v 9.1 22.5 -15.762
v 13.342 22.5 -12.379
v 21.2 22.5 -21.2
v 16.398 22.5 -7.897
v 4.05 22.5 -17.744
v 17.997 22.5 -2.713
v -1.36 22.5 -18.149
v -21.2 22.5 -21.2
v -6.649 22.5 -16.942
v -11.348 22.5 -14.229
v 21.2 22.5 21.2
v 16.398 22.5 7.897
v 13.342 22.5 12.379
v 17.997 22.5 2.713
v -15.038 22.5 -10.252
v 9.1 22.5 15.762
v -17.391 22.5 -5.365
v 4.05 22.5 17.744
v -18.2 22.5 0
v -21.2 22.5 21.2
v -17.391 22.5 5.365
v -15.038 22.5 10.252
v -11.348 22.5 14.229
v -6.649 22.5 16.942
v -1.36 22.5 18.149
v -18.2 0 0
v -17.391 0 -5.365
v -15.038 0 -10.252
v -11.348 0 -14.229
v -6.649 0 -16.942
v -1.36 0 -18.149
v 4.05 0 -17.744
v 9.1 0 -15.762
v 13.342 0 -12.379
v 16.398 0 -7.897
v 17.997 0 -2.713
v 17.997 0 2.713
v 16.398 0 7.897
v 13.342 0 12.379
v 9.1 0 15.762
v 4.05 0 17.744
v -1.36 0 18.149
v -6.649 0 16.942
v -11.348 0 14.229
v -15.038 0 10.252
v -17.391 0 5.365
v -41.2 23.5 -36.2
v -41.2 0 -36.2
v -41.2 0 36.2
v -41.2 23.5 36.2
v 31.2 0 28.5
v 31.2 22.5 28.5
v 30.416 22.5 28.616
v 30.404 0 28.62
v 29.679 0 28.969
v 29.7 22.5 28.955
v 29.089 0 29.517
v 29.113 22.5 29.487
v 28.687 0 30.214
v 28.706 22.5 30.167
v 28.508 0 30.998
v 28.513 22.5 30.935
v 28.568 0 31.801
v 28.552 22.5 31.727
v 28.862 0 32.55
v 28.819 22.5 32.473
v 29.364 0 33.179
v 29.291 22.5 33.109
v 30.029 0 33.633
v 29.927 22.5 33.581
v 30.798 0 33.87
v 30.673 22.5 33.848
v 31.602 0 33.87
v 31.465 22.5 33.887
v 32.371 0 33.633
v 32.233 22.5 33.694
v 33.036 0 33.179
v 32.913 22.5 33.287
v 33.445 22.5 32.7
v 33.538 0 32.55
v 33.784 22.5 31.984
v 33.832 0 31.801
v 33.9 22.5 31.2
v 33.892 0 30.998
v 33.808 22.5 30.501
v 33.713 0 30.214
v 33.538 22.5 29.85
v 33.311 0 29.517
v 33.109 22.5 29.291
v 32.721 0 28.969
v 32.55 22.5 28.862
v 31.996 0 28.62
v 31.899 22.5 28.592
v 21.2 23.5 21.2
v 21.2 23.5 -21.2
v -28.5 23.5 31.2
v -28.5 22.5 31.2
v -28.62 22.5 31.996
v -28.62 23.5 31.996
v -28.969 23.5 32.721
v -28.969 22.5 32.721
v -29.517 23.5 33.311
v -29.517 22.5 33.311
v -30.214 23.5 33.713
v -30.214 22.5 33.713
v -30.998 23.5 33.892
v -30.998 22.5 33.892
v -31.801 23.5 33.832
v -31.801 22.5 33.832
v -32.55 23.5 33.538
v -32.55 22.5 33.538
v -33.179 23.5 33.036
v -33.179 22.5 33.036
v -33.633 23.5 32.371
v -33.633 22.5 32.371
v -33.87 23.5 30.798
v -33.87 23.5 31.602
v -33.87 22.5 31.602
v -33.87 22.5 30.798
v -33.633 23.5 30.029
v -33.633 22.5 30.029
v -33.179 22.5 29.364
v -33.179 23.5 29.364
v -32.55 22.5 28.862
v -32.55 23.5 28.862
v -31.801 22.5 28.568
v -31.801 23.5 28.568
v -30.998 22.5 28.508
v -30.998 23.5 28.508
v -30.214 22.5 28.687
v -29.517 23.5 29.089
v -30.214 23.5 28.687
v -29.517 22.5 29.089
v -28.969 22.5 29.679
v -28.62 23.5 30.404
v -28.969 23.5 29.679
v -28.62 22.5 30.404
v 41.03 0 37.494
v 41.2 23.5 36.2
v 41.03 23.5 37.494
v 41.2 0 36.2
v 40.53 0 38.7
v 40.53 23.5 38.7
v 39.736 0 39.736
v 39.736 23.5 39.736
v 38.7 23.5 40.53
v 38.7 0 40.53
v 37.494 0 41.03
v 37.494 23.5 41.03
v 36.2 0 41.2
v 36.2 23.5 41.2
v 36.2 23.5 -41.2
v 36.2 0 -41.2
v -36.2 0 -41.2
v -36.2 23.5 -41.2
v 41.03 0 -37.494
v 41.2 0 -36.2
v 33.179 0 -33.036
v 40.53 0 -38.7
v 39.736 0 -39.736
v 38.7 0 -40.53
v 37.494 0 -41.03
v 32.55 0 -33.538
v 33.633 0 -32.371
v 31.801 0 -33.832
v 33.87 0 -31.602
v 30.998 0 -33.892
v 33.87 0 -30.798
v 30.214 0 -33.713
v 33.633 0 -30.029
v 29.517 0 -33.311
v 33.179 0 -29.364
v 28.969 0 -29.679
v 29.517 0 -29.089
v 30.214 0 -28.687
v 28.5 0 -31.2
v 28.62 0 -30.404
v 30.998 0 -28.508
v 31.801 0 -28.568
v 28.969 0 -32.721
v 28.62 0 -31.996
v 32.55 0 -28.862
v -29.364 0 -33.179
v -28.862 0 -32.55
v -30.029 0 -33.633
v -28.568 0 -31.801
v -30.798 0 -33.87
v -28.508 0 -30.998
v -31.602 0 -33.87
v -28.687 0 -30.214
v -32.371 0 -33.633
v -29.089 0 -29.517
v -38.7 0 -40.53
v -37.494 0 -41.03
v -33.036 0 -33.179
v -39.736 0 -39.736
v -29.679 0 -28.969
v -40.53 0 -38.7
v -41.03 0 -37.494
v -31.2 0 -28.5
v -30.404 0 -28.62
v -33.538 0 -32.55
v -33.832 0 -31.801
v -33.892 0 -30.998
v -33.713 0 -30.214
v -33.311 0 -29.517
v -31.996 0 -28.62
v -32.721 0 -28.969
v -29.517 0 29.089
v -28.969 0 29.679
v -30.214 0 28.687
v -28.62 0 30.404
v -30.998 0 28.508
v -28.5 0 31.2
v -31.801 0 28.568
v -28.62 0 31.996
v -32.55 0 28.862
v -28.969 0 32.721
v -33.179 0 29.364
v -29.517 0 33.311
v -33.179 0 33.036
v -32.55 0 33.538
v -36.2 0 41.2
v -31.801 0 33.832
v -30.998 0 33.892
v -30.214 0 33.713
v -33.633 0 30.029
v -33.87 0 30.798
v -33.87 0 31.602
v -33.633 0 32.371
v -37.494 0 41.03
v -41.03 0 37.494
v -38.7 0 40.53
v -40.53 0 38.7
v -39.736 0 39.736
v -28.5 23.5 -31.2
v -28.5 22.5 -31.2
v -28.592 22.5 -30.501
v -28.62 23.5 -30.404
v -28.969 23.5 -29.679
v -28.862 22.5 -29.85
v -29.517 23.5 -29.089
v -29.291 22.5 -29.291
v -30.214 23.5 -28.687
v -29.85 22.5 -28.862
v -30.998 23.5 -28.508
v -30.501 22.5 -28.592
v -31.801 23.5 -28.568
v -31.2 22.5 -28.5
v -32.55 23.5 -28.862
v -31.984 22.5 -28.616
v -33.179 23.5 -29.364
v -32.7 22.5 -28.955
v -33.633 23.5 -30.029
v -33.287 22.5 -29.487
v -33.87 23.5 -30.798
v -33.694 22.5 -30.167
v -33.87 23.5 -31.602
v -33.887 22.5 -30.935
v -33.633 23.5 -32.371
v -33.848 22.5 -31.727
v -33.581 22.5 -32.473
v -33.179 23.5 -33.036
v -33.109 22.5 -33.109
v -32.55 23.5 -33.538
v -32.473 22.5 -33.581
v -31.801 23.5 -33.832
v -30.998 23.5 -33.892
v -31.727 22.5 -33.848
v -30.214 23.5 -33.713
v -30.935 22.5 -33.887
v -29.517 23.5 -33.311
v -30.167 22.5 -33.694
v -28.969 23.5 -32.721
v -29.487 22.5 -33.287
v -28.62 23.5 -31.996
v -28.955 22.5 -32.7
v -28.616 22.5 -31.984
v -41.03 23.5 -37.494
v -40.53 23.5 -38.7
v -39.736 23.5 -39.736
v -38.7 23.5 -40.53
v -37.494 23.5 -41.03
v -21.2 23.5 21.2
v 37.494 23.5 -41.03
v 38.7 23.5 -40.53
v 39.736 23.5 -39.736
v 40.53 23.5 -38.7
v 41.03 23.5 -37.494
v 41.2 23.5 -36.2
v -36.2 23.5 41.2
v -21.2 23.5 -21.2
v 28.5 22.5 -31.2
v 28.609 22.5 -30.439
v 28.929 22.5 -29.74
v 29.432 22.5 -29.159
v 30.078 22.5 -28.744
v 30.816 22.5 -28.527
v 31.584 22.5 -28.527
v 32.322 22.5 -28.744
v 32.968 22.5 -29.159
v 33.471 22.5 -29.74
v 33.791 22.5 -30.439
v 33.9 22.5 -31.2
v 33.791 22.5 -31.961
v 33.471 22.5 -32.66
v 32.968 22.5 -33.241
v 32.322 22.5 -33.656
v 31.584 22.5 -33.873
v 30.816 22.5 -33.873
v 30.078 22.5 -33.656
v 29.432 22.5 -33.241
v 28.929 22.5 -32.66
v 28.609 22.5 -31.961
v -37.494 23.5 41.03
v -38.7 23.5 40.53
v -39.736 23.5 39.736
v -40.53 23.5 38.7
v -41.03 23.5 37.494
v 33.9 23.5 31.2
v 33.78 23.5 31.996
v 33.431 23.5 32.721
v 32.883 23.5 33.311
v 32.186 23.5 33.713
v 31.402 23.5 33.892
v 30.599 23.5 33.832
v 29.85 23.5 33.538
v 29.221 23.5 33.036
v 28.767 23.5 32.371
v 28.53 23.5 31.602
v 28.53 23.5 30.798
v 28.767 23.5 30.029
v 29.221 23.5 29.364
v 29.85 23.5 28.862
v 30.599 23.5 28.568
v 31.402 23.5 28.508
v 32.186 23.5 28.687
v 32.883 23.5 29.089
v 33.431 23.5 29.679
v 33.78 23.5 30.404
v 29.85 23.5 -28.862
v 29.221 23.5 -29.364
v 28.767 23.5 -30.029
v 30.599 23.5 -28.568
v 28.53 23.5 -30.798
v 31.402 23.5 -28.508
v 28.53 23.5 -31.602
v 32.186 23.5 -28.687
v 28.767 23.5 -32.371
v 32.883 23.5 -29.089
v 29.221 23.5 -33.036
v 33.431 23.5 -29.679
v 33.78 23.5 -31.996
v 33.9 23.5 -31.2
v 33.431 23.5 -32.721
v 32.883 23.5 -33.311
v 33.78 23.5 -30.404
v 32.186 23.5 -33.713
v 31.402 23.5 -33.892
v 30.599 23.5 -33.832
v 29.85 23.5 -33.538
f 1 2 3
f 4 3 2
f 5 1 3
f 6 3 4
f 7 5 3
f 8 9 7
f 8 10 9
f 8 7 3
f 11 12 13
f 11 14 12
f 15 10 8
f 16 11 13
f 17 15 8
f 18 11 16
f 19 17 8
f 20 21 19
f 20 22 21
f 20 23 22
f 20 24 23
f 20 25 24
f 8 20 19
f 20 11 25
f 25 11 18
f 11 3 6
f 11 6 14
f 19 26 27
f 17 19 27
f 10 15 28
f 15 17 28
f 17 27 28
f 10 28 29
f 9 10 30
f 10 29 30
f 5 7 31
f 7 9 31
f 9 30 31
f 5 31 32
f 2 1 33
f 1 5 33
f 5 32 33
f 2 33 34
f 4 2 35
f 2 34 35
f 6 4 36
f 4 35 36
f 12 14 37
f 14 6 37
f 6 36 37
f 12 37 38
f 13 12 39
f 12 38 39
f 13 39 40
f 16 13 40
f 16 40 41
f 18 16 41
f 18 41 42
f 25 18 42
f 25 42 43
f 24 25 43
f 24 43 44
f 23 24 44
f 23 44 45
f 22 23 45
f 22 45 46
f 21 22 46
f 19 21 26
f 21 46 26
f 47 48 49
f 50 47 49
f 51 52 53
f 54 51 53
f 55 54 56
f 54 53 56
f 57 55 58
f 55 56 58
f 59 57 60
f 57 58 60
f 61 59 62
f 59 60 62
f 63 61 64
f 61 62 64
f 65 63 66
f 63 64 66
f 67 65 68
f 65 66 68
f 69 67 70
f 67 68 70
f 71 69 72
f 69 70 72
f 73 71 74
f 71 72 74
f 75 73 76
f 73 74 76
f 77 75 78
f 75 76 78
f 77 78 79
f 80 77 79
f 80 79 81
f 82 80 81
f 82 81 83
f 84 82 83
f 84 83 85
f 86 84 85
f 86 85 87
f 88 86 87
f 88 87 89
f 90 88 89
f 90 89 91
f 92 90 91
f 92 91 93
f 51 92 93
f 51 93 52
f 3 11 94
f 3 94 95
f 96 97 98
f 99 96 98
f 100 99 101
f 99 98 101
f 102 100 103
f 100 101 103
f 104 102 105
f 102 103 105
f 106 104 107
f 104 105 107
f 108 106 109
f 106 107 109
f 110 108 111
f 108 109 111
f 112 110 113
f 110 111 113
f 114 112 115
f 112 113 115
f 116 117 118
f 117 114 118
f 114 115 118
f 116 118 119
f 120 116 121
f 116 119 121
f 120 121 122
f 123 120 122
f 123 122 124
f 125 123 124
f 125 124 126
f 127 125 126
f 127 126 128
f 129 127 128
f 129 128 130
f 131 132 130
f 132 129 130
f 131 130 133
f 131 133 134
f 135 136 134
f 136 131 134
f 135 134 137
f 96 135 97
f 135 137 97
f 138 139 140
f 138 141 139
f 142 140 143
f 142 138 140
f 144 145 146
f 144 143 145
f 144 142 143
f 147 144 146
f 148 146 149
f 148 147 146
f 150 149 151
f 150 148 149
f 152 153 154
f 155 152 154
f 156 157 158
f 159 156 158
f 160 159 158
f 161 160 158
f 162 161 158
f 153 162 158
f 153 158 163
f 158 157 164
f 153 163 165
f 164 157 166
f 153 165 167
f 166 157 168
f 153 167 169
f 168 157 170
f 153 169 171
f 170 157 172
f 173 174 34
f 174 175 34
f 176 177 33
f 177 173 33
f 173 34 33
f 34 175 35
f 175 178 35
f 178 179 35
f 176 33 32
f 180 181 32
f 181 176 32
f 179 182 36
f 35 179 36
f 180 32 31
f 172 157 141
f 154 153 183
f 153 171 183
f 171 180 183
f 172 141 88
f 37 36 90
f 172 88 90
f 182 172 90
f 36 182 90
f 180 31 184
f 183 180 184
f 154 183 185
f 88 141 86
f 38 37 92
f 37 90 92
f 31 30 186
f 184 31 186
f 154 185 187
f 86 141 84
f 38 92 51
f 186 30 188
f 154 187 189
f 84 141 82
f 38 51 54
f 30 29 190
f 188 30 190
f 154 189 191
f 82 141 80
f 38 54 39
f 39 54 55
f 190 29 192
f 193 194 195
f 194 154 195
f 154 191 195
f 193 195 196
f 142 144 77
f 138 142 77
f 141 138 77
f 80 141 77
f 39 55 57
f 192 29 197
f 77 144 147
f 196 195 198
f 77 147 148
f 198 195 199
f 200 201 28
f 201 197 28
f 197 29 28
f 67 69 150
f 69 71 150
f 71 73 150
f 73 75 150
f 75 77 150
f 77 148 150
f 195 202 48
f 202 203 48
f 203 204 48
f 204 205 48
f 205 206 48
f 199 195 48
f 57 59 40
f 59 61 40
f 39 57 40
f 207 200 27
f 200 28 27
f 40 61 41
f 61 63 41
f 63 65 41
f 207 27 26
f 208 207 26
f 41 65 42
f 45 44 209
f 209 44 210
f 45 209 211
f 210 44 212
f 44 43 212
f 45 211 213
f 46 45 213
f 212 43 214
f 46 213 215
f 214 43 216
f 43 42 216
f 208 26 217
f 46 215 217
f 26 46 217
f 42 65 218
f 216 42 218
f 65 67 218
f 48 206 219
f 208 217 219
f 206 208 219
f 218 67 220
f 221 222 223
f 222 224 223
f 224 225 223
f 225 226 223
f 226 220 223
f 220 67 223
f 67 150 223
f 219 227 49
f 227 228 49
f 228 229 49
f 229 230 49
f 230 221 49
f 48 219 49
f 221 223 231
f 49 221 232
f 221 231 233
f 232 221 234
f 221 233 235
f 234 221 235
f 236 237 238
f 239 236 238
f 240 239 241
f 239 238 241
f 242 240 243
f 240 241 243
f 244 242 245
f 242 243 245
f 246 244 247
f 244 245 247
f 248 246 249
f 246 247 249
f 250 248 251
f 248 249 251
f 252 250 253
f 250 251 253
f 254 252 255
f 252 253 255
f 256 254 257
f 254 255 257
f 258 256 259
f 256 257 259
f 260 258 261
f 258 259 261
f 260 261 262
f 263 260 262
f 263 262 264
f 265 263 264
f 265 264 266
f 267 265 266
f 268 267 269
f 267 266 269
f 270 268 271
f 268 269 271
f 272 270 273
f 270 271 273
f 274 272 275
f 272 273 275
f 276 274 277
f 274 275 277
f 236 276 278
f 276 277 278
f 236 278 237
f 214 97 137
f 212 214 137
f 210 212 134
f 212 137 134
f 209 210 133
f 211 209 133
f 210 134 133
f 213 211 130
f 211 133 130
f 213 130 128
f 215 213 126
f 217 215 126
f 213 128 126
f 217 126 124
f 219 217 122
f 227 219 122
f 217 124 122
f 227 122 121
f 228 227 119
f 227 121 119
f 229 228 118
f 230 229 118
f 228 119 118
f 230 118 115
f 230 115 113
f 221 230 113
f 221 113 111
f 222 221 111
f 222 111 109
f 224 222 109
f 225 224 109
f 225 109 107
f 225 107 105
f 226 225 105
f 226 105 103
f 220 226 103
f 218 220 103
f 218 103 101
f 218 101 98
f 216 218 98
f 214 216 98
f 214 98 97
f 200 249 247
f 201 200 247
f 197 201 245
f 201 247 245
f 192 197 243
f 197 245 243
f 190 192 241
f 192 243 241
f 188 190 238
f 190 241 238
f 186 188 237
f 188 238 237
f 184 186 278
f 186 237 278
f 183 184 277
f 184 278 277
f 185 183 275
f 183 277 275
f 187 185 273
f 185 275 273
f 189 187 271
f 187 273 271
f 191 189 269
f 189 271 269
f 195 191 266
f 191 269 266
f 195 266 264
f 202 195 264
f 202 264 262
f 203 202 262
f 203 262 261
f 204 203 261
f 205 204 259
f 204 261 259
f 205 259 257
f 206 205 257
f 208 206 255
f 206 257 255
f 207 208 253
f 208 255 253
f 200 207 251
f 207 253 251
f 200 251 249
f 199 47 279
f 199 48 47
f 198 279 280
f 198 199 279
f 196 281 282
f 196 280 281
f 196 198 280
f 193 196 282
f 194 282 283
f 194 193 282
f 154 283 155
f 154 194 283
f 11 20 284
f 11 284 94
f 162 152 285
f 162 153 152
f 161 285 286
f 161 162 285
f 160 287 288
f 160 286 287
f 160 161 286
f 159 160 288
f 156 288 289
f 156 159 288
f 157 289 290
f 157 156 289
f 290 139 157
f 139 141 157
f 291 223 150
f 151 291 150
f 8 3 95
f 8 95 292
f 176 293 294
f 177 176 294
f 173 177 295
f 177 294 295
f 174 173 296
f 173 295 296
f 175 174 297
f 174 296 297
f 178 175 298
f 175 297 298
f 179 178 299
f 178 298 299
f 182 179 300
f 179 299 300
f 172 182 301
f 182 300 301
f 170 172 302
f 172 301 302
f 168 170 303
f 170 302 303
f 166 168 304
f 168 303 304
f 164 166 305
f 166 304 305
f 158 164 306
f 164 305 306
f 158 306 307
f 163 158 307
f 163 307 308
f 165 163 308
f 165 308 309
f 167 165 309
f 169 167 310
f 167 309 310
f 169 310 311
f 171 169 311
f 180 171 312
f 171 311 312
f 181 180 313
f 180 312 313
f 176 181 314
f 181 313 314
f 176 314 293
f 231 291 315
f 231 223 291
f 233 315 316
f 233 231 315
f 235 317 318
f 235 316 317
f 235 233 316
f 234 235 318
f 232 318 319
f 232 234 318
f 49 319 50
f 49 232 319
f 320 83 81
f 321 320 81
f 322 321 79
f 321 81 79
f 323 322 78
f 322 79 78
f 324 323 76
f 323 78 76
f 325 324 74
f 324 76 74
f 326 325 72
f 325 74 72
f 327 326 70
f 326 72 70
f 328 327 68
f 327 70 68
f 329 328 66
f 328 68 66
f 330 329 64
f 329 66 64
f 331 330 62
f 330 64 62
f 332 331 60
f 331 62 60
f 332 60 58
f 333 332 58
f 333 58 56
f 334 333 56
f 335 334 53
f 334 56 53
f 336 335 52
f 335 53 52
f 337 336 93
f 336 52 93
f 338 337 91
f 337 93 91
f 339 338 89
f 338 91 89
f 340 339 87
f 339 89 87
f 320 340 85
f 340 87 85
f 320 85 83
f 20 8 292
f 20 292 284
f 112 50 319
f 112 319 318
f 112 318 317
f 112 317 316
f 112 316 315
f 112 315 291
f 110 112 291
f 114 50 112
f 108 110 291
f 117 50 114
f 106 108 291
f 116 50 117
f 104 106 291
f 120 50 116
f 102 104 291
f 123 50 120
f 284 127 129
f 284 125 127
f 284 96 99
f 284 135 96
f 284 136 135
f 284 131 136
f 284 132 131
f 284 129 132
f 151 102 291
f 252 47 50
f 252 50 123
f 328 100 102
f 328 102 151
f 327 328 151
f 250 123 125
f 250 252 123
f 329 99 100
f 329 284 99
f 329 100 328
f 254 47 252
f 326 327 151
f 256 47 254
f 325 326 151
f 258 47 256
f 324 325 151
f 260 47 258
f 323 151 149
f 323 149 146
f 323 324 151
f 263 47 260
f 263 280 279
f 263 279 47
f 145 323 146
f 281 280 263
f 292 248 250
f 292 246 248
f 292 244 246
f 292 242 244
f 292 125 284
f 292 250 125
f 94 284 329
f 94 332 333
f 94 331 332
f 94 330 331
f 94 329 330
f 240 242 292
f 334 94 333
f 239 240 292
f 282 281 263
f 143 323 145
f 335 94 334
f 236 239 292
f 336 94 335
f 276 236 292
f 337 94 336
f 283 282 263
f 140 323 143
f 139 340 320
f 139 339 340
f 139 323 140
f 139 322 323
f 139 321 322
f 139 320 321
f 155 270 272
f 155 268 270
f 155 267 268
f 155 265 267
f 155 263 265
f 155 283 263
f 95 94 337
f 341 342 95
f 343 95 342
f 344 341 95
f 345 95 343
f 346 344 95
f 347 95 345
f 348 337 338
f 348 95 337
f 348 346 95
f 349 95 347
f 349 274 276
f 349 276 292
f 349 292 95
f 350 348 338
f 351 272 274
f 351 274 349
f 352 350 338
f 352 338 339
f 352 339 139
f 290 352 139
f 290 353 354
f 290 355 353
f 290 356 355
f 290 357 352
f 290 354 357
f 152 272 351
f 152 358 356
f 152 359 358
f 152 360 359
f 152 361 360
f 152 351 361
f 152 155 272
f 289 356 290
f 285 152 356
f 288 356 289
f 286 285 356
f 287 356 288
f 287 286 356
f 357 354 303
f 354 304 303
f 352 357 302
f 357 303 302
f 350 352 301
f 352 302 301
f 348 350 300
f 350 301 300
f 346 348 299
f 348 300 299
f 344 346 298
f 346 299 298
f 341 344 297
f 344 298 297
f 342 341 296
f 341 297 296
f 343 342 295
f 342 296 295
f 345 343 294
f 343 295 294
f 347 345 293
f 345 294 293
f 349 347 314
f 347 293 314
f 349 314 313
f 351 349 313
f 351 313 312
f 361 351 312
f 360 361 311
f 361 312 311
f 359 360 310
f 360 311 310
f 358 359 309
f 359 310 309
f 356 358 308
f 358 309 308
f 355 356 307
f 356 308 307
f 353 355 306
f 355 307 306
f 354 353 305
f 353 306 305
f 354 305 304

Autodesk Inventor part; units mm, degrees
ref_plane "YZ Plane" through (0, 0, 0) normal (1, 0, 0) x (0, 1, 0)
ref_plane "XZ Plane" through (0, 0, 0) normal (0, 1, 0) x (-1, 0, 0)
ref_plane "XY Plane" through (0, 0, 0) normal (0, 0, 1) x (1, 0, 0)
sketch "Boceto1" plane through (0, 0, 0) normal (0, 1, 0) x (-1, 0, 0)
  line L0 (-41.2, 41.2) -> (41.2, 41.2)
  line L1 (41.2, 41.2) -> (41.2, -41.2)
  line L2 (41.2, -41.2) -> (-41.2, -41.2)
  line L3 (-41.2, -41.2) -> (-41.2, 41.2)
  line L4 (-41.2, 41.2) -> (41.2, -41.2) construction
  line L5 (41.2, 41.2) -> (-41.2, -41.2) construction
  circle A0 centre (0, 0) radius 18.2
  dimension "d0" = 82.4
  dimension "d1" = 82.4
  dimension "d2" = 36.4
extrude "Extrusión1" add sketch "Boceto1" along normal blind 22.5
sketch "Boceto2" plane through (0, 22.5, 0) normal (0, 1, 0) x (1, 0, 0)
  circle A0 centre (-31.2, -31.2) radius 2.7
  line L0 (-41.2, 41.2) -> (-41.2, -41.2) projected
  line L1 (-41.2, -41.2) -> (41.2, -41.2) projected
  point P0 (0, 0)
  dimension "d5" = 5.4
  dimension "d6" = 10
  dimension "d7" = 10
extrude "Extrusión2" cut sketch "Boceto2" against normal through all
pattern_circular "Patrón circular1" count 4 over 360 about axis through (0, 0, 0) along (0, 1, 0) of "Extrusión2"
fillet "Empalme1" radius 5 4 edges at (-41.2, 11.25, 41.2) (41.2, 11.25, 41.2) (41.2, 11.25, -41.2) (-41.2, 11.25, -41.2)
sketch "Boceto3" plane through (0, 22.5, 0) normal (0, 1, 0) x (1, 0, 0)
  line L0 (-21.2, -21.2) -> (21.2, -21.2)
  line L1 (21.2, -21.2) -> (21.2, 21.2)
  line L2 (21.2, 21.2) -> (-21.2, 21.2)
  line L3 (-21.2, 21.2) -> (-21.2, -21.2)
  line L4 (-21.2, -21.2) -> (21.2, 21.2) construction
  line L5 (21.2, -21.2) -> (-21.2, 21.2) construction
  arc A0 (-36.2, 41.2) -> (-41.2, 36.2) centre (-36.2, 36.2) ccw projected
  line L6 (-41.2, 36.2) -> (-41.2, -36.2) projected
  arc A1 (-41.2, -36.2) -> (-36.2, -41.2) centre (-36.2, -36.2) ccw projected
  line L7 (-36.2, -41.2) -> (36.2, -41.2) projected
  arc A2 (36.2, -41.2) -> (41.2, -36.2) centre (36.2, -36.2) ccw projected
  line L8 (41.2, -36.2) -> (41.2, 36.2) projected
  arc A3 (41.2, 36.2) -> (36.2, 41.2) centre (36.2, 36.2) ccw projected
  line L9 (36.2, 41.2) -> (-36.2, 41.2) projected
  circle A4 centre (-31.2, 31.2) radius 2.7 projected
  circle A5 centre (31.2, 31.2) radius 2.7 projected
  circle A6 centre (31.2, -31.2) radius 2.7 projected
  circle A7 centre (-31.2, -31.2) radius 2.7 projected
  circle A8 centre (0, 0) radius 18.2 projected
  dimension "d14" = 42.4
  dimension "d15" = 42.4
extrude "Extrusión3" add sketch "Boceto3" along normal blind 1 contours L9 A3 L8 A2 L7 A1 L6 A0
properties part number "Base"
